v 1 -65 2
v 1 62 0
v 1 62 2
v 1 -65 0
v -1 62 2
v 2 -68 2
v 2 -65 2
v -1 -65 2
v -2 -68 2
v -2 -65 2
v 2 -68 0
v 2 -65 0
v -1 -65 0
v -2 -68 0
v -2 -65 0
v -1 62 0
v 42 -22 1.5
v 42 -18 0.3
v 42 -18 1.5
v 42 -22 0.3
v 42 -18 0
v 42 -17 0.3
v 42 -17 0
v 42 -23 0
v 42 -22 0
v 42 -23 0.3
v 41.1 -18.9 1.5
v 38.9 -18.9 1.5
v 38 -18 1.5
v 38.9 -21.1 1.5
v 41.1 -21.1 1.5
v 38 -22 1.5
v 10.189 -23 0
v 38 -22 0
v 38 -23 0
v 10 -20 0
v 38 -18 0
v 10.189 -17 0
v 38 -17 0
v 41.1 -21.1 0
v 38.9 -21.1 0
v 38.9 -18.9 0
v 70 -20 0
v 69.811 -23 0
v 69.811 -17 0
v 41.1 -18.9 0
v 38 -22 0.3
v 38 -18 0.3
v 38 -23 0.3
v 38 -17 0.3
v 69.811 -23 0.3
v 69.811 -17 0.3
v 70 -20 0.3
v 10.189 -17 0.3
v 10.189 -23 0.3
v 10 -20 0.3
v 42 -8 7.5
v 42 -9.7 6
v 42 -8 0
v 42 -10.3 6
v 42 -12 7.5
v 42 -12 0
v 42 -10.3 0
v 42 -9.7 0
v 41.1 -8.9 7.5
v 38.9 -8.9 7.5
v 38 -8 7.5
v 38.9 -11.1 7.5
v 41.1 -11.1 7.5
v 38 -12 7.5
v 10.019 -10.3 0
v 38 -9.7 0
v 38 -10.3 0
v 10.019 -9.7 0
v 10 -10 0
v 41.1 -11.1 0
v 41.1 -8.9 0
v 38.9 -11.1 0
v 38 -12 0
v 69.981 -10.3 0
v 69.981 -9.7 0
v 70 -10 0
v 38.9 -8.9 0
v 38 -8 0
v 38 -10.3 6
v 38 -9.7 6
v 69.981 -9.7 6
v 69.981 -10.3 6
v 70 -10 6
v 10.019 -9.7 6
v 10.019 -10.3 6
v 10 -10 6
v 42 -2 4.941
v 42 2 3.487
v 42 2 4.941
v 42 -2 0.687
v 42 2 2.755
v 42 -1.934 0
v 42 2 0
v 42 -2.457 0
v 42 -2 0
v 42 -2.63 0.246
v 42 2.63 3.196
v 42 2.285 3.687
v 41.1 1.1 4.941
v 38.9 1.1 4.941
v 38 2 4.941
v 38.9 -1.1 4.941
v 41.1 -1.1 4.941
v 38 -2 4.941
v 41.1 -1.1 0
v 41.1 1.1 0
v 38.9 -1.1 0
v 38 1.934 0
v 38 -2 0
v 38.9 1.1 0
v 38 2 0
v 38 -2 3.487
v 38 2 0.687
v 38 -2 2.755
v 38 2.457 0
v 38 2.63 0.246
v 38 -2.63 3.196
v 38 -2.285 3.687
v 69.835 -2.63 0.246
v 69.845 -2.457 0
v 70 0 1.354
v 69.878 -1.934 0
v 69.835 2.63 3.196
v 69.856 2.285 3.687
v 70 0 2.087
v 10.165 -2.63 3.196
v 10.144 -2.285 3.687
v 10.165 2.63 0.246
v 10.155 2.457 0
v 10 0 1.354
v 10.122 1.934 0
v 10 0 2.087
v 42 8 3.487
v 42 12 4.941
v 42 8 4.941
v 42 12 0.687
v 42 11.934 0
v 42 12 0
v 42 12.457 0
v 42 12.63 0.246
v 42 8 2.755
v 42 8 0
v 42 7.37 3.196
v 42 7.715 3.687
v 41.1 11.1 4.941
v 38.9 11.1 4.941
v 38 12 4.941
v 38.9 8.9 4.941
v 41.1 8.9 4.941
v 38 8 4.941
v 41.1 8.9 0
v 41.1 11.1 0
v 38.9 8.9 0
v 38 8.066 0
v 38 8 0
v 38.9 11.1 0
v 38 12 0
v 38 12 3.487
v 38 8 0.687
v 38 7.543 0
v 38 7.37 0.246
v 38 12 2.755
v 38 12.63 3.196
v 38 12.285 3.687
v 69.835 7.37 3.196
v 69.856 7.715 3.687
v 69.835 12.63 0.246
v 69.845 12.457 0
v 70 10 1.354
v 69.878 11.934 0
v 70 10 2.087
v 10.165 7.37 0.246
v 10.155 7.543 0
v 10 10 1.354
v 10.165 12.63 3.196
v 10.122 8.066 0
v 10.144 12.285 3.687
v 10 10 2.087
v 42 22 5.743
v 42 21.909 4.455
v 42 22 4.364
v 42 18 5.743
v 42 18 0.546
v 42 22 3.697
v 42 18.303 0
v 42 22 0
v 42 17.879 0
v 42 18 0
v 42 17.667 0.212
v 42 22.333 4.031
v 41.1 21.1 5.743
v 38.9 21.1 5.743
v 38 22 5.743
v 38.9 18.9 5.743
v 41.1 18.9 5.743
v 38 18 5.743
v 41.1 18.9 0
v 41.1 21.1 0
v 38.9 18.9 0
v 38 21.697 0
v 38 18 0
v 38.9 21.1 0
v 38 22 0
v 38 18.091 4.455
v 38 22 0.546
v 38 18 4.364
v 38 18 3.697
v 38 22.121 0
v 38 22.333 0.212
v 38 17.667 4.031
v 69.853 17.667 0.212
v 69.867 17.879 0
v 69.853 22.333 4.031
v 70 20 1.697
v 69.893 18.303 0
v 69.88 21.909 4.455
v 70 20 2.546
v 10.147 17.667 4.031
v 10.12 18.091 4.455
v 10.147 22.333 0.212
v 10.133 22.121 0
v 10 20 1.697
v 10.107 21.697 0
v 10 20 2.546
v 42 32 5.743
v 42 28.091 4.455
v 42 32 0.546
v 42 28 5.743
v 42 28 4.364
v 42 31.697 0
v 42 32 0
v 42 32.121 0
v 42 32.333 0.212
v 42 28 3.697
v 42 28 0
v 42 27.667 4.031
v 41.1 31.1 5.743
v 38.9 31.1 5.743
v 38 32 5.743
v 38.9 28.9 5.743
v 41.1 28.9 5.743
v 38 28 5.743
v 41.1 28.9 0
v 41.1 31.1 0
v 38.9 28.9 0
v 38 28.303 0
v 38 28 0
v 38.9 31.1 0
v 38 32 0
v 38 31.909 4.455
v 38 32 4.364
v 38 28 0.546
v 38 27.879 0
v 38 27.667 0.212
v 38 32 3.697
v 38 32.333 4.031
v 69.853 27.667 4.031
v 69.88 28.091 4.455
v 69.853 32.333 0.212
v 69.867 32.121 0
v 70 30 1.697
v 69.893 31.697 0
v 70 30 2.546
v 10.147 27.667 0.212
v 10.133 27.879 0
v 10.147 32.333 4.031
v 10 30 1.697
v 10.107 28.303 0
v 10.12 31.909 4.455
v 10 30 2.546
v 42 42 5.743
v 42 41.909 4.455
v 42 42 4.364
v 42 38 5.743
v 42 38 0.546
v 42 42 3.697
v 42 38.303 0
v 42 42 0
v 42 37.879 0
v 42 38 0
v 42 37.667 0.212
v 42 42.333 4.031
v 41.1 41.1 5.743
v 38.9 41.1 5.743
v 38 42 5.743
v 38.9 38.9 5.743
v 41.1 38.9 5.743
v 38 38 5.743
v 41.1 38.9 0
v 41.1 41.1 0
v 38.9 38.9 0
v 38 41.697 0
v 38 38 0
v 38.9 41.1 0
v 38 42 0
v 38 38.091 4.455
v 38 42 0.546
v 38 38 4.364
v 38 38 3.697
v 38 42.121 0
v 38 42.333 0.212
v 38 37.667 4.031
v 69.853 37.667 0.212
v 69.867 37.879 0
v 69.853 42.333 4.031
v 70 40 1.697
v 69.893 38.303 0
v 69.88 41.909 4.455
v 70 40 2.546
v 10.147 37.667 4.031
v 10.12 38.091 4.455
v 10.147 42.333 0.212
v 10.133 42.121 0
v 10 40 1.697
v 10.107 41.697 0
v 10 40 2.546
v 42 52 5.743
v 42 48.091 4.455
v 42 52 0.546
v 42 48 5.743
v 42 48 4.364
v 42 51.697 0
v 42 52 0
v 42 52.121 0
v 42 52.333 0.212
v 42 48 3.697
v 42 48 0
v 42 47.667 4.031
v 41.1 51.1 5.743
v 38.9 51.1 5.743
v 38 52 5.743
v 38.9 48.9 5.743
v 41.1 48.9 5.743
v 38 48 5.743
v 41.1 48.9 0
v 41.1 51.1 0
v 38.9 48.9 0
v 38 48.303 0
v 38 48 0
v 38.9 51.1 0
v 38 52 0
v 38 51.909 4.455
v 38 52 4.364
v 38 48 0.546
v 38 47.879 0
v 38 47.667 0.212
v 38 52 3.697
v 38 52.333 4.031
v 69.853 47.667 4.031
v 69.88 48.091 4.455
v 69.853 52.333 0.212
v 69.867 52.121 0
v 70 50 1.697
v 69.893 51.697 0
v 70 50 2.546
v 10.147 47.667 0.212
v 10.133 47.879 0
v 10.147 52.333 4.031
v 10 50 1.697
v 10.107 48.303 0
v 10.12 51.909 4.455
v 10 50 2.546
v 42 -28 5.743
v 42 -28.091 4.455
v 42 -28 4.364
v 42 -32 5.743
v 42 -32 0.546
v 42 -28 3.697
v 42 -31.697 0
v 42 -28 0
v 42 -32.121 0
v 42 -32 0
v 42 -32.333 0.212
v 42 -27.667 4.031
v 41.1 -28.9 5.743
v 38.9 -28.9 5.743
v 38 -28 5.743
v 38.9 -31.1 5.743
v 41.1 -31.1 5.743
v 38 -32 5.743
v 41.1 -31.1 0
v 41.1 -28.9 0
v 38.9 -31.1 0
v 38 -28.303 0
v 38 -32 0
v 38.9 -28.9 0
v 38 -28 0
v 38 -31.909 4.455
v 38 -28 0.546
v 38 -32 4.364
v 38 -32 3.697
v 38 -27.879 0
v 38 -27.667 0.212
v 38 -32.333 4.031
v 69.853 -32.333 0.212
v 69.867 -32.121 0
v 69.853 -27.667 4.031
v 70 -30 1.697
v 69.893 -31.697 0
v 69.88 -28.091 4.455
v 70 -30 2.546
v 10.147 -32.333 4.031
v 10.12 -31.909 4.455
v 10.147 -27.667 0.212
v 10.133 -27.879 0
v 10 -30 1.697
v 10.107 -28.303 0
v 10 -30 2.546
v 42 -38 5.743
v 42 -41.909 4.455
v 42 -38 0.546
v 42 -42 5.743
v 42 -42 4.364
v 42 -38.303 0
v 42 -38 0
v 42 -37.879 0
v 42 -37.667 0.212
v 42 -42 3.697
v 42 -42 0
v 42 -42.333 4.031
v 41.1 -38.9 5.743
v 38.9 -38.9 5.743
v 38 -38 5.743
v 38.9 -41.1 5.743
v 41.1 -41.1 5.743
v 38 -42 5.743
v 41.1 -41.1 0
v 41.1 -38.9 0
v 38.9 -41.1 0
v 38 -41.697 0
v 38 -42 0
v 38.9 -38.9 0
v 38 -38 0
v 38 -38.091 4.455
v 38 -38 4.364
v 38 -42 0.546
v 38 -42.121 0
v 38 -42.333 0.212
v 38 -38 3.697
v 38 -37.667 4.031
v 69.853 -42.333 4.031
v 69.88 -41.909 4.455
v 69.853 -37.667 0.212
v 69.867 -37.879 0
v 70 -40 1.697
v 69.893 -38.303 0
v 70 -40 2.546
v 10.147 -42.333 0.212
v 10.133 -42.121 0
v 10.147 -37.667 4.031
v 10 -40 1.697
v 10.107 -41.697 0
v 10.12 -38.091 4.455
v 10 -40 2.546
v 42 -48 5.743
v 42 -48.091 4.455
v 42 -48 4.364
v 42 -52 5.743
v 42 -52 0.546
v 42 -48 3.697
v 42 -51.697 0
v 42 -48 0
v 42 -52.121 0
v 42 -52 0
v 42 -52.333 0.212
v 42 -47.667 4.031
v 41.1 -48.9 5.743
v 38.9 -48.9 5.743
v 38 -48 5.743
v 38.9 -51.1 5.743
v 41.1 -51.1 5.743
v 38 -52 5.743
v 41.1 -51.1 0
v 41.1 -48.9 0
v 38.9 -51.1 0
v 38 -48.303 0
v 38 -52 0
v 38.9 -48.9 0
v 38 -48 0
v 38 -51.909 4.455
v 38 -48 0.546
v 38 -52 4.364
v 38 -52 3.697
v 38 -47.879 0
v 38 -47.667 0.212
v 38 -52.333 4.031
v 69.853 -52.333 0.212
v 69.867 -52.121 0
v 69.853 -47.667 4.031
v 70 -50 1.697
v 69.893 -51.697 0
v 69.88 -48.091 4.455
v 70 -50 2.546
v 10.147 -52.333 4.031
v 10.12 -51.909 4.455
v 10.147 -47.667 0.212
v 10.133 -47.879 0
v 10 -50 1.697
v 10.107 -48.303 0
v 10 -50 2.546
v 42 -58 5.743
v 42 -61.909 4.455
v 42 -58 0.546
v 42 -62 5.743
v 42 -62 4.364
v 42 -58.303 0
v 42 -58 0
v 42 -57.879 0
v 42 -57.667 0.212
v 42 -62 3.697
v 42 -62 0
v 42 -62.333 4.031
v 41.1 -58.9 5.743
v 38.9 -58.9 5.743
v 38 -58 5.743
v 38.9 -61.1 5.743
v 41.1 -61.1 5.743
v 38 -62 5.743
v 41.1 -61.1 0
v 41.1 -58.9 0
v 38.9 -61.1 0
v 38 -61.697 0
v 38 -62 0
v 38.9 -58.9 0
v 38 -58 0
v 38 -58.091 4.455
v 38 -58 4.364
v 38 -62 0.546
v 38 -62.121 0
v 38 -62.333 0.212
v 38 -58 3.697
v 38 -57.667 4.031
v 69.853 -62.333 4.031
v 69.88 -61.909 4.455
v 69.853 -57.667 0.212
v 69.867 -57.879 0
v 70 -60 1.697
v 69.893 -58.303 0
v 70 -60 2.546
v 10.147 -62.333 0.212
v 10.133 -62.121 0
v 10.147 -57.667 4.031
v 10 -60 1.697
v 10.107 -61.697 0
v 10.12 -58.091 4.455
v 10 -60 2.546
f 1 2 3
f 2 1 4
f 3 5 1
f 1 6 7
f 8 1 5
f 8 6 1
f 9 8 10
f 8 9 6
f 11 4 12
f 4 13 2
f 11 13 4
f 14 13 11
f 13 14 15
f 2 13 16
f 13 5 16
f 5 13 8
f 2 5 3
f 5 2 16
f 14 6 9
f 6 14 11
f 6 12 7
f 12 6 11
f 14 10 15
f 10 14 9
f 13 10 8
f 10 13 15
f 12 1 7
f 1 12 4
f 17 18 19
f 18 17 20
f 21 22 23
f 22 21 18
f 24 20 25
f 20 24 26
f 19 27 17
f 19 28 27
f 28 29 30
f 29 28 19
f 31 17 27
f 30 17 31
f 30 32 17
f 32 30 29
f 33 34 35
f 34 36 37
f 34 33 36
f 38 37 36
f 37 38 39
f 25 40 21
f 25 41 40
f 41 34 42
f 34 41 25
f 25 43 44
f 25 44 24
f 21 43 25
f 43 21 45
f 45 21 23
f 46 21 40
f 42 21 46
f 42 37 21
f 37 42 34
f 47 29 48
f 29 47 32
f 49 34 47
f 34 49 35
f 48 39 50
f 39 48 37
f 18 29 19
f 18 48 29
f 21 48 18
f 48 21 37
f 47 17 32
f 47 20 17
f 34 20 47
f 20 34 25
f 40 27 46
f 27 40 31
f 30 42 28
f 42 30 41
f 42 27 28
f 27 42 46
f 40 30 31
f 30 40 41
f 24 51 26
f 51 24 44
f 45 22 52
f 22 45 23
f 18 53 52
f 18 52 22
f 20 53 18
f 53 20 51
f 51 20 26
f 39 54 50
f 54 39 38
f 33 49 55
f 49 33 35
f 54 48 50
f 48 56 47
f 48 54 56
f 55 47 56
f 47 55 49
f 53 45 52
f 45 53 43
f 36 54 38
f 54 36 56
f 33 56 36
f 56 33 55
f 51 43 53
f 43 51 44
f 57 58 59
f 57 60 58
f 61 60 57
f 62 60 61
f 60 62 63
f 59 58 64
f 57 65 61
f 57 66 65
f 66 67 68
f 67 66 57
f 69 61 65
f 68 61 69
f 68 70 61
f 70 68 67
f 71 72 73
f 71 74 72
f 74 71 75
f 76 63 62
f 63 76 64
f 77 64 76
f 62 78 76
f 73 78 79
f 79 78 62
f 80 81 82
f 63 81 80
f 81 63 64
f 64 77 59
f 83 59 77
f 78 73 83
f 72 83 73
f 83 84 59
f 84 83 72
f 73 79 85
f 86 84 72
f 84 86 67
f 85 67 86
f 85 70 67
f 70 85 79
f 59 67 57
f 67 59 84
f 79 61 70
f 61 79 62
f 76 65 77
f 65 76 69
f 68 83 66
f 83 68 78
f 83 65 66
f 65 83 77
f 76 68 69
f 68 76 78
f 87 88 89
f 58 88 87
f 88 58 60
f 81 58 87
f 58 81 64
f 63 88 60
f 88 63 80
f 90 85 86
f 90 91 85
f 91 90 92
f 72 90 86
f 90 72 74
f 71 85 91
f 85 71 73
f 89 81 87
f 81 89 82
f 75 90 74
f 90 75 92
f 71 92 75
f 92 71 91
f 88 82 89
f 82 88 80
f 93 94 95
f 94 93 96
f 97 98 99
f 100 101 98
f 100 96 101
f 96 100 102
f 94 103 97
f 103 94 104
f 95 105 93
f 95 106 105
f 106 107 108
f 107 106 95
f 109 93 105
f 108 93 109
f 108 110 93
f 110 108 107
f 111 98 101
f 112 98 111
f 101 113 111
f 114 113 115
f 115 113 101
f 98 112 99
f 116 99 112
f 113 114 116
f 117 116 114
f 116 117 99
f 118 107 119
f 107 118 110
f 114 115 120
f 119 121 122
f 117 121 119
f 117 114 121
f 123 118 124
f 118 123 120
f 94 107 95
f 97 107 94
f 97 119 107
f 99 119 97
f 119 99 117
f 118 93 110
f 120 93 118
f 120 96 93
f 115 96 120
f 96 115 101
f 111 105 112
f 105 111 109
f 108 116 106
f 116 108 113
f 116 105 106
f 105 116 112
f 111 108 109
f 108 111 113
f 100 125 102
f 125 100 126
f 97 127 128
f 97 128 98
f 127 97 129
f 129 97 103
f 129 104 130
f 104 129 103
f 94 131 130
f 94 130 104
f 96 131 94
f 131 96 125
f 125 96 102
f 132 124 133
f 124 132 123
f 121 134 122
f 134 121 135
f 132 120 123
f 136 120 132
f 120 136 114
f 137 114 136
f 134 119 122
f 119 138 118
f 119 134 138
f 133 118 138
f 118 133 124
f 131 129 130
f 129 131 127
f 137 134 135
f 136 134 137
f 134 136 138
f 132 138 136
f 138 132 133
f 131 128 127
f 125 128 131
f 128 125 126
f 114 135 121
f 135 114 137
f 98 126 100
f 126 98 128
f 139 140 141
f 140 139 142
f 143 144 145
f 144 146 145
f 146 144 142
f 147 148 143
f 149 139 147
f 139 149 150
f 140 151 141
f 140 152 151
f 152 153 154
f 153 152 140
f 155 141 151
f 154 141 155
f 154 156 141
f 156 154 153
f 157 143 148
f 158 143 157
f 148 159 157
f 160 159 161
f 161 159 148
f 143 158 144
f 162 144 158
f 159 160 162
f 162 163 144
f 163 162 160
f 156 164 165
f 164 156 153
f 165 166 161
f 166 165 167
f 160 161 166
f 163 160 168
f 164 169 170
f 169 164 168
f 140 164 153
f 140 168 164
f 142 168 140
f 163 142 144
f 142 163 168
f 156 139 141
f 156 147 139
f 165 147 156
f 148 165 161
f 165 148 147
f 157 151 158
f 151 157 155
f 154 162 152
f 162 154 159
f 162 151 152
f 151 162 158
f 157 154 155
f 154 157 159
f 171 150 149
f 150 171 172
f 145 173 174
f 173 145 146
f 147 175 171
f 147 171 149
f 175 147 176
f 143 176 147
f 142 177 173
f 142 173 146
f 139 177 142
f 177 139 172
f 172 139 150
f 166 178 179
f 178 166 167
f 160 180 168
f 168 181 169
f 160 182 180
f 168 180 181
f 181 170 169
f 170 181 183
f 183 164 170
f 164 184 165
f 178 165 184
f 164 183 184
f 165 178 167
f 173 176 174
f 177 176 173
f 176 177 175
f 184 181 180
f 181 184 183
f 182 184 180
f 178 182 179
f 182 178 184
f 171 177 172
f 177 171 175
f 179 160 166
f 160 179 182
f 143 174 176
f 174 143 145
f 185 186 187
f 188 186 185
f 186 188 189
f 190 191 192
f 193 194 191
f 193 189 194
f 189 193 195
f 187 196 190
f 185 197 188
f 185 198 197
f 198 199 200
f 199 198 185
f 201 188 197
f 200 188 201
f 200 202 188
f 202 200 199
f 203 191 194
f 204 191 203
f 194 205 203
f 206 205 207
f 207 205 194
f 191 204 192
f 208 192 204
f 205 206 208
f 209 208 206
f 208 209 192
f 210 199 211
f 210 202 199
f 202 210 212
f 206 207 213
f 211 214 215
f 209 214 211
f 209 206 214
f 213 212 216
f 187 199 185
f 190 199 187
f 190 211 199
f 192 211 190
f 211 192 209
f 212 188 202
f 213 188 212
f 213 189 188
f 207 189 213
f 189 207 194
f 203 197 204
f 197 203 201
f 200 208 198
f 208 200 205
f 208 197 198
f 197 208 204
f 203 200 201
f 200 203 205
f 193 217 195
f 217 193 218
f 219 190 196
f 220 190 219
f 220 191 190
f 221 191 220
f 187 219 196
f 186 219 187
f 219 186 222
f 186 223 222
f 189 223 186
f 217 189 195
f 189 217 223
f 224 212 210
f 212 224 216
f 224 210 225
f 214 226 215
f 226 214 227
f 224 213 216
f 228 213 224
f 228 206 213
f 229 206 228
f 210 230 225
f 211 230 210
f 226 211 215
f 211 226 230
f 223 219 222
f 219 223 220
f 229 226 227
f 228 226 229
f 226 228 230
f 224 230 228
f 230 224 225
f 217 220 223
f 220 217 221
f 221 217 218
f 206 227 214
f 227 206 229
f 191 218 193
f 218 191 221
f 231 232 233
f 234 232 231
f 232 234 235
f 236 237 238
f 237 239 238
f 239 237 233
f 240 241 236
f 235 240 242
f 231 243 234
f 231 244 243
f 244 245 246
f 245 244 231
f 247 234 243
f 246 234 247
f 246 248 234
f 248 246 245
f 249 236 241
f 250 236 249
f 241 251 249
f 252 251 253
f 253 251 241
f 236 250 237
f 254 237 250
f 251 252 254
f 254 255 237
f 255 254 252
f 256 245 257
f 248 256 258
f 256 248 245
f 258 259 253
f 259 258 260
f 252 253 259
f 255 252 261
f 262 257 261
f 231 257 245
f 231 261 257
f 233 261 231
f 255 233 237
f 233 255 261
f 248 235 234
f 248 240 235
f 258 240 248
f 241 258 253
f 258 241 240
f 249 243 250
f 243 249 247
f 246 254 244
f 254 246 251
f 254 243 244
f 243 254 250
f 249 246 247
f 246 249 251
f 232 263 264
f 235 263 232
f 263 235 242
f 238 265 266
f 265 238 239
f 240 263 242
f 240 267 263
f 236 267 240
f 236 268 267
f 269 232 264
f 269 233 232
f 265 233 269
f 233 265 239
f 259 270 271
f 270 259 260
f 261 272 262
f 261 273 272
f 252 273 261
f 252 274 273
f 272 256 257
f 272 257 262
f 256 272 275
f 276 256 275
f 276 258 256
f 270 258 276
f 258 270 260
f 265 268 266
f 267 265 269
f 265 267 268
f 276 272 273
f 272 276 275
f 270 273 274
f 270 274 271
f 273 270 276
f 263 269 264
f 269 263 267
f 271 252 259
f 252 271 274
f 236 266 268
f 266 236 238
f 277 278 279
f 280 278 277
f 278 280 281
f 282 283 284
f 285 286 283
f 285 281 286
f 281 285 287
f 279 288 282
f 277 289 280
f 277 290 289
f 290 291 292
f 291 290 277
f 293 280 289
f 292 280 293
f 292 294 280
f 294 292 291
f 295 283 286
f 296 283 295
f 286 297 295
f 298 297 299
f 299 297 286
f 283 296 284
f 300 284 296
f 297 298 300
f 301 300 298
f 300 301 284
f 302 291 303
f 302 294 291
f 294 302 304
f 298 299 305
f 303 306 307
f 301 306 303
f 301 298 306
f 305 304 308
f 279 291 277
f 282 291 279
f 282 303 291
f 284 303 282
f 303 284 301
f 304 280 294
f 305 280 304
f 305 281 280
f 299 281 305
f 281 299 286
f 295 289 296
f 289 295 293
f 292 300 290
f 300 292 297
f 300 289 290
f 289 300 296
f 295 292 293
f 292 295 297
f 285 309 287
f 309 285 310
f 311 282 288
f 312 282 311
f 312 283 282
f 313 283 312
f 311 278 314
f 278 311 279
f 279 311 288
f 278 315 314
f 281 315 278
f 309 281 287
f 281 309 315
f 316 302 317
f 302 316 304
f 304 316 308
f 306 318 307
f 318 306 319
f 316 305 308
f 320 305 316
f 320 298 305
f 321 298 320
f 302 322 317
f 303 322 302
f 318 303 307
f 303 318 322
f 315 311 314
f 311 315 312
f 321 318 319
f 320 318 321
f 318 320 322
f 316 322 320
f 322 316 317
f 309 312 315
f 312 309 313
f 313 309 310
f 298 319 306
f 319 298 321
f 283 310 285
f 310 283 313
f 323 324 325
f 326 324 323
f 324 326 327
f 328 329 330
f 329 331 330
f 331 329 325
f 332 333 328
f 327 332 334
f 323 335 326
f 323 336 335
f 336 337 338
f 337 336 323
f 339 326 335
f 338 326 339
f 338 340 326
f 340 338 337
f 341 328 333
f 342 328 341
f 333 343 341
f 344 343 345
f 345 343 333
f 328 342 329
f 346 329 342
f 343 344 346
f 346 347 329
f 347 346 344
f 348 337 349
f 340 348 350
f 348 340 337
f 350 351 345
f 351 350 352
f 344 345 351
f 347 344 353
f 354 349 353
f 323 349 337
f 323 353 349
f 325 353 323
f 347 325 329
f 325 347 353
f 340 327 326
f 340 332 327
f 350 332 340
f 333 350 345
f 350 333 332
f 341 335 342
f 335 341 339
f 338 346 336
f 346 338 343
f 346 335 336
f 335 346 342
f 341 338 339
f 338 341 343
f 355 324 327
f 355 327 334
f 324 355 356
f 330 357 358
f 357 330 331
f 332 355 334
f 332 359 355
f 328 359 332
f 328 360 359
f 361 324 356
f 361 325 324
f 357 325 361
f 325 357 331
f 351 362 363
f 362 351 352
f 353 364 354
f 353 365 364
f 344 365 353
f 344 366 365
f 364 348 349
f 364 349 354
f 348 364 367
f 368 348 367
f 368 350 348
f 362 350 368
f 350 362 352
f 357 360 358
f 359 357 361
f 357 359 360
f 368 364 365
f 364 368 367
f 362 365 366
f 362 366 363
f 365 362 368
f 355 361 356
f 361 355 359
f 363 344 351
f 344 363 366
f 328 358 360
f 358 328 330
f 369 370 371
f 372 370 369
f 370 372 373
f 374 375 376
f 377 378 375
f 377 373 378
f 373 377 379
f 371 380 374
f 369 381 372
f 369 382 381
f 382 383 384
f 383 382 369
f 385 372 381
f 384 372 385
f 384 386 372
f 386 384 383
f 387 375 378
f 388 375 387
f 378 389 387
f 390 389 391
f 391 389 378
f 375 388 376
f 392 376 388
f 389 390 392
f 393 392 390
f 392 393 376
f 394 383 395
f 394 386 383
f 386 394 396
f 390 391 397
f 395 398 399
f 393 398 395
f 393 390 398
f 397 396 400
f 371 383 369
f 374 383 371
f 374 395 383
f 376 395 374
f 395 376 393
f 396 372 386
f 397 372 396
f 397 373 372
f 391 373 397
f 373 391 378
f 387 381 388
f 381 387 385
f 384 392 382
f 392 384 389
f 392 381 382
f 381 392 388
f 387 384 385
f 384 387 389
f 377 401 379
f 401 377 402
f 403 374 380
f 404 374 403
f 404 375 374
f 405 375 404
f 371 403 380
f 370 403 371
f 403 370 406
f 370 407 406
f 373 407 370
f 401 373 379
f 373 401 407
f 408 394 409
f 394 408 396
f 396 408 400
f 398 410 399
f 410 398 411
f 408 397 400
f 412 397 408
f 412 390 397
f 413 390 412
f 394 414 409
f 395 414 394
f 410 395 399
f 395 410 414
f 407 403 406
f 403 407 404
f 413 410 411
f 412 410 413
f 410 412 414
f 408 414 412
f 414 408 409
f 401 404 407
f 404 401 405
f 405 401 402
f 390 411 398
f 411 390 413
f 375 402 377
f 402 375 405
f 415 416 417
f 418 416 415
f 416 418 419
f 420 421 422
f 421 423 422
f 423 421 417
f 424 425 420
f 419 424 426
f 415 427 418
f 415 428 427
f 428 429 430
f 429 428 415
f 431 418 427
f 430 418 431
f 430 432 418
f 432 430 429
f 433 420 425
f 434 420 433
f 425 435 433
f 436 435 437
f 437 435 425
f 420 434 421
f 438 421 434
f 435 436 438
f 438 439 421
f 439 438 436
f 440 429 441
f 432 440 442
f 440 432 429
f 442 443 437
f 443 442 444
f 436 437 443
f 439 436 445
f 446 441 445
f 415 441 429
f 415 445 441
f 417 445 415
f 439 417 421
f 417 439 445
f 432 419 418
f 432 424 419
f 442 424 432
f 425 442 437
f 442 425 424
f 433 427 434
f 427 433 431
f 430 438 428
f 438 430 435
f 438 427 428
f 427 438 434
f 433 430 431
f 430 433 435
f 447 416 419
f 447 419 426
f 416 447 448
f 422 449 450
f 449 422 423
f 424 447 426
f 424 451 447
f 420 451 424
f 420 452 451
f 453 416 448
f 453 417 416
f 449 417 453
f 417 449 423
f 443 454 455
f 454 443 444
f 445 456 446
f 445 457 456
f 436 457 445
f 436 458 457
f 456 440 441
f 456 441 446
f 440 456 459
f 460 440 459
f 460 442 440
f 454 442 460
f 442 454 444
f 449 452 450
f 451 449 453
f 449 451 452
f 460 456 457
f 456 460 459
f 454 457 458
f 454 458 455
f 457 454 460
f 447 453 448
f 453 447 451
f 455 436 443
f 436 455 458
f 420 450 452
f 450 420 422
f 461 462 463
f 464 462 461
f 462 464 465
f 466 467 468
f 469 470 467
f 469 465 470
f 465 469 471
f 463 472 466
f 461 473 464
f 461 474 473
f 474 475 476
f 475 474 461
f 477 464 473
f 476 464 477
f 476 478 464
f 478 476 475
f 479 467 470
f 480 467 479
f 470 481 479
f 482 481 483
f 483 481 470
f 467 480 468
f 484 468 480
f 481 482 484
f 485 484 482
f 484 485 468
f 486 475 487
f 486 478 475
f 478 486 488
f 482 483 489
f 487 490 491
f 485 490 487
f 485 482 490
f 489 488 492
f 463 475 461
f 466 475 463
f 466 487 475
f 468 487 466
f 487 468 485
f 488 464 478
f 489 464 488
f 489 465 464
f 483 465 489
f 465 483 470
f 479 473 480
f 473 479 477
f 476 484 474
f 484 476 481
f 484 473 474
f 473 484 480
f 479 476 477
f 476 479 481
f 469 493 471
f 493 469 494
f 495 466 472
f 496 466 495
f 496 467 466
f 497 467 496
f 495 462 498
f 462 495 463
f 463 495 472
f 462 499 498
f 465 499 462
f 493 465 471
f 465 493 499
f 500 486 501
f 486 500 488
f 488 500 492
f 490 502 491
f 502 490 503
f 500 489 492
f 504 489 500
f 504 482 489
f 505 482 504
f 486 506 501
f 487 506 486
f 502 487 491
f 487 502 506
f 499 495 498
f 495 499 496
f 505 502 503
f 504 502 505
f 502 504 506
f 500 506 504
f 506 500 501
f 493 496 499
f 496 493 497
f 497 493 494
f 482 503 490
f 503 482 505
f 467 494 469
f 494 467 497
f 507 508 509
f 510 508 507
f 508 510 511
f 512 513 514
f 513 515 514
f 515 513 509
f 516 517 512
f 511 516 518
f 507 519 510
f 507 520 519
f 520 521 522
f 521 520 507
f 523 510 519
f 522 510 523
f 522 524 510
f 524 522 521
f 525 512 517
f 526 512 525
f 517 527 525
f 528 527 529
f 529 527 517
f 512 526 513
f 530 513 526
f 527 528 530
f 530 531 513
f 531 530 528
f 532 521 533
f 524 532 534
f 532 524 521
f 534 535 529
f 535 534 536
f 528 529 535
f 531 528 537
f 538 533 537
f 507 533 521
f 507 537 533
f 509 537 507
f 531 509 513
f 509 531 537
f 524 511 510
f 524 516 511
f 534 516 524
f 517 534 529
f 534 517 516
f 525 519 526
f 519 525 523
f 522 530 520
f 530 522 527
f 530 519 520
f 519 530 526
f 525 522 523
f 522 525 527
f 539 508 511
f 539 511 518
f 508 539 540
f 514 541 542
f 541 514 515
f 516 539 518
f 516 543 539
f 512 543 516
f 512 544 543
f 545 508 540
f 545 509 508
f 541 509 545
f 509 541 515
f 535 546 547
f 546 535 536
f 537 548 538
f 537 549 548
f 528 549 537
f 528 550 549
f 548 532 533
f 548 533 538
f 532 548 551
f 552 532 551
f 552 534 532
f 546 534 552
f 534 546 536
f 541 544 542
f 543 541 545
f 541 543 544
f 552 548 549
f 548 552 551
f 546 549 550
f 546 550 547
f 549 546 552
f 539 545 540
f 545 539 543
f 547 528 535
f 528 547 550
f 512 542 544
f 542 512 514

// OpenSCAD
$fn=50;
ts=2;
tl=0.6;

//шприц
di=60;//диаметр внутри
do=22;//диаметр снаружи
li=136;//длина внутри
duh=60;//диаметр уха 
huh=2.6;//толщина уха
dno=4.4;//диаметр носика у основания, у конца на % меньше
hno=10;//длина носика
ugol=30;

tn=1;//толщина среза вала
zv=5; //высота центрального диска вала
ze=5; //высота центрального диска ерша
zskr=zv+ze;
dskr=10;//диаметр центрального диска
dval=3+0.4;//диаметр вала привода

f_sh=4.0; //ширина фиксатора
ft=1.5; //основная толщина фиксатора
zbf=2.5+ft;//зуб фиксатора
nfix=10;//нога фиксатора

hv=3;//зазор между винтами

//fix_pr ();
module fix_pr (){
    //translate([ft/2,(ph3[8][1]+fxw+fdoz)/2-fttz-fxw,f_sh/2])cube([ft, ph3[8][1]+fxw+fdoz,f_sh],true);
    //translate([(fog)/2,-ts/2-2,f_sh/2])cube([fog, ts,f_sh],true);
    translate([-ft/2,nfix/2,f_sh/2])cube([ft, nfix,f_sh],true);
    translate([0,-14.5,0])linear_extrude(f_sh)polygon([[0,0],[-ft,0],[-zbf,15],[0,14.5]]);//0.5 вынужденная поправка в связи с ошибкой во втором слое
}


//disk_z();

module disk_z(){
    translate([0,dval/2,zv/2+ze])cube([3,tn,zv],true);
    difference(){
        translate([0,0,0])cylinder(zskr,dskr/2,dskr/2);
        translate([0,0,ze-0.1])cylinder(zv+0.2,dval/2,dval/2);
        translate([0,0,-0.1+ze/2])cube([ts+0.2,ts+0.2,ze+0.2],true);
    }
}


//ersh();

module ersh(){
    translate([0,li/2-3,ts/2])cube([ts,li,ts],true);
    translate([0,0,0])vint();
    translate([0,5,0])vint();
    translate([0,10,0])vint();
    translate([0,15,0])vint();
    translate([0,20,0])vint();
    translate([0,25,0])vint();
    translate([0,30,0])vint();
    translate([0,35,0])vint();
    translate([0,40,0])vint();
    translate([0,45,0])vint();
    translate([0,50,0])vint();
    translate([0,55,0])vint();
    translate([0,60,0])vint();
    //translate([0,65,0])vint();
    //translate([0,70,0])vint();
    //translate([0,80,0])vint();
}
//vint();
module vint(){
    translate([0,0,ts/2])intersection(){
        union(){
            translate([5*di/12,0,0])rotate([ugol,0,0])cube([di/6,tl,3*ts],true);
            translate([4*di/12,0,0])cube([tl,ts,3*ts],true);
            translate([-5*di/12,0,0])rotate([-ugol,0,0])cube([di/6,tl,3*ts],true);
            translate([-4*di/12,0,0])cube([tl,ts,3*ts],true);
            translate([2*di/12,0,0])rotate([-ugol,0,0])cube([di/3,tl,3*ts],true);
            translate([-2*di/12,0,0])rotate([ugol,0,0])cube([di/3,tl,3*ts],true);
        }
        cube([2*di,li,ts],true); 
    }
}

//ersh_k();

module ersh_k(){
    dd=6;
    translate([0,(li-dd)/2-3,ts/2])cube([ts,(li-dd),ts],true);
    translate([0,0,0])vint1();
    translate([0,10,0])vint1();
    translate([0,20,0])vint1();
    translate([0,30,0])vint1();
    translate([0,40,0])vint1();
    translate([0,50,0])vint1();
    translate([0,60,0])vint1();
    //translate([0,70,0])vint();
    //translate([0,80,0])vint();
}
//cube([di,tl,3*ts],true);
//vint1();
module vint1(){
    translate([0,0,ts/2])intersection(){
        union(){
            translate([3*di/8,0,0])rotate([90,0,0])cube([di/4,tl,3*ts],true);
            translate([di/4,0,0])cube([tl,ts,3*ts],true);
            translate([-3*di/8,0,0])rotate([90,0,0])cube([di/4,tl,3*ts],true);
            translate([-di/4,0,0])cube([tl,ts,3*ts],true);
            translate([1*di/8,0,0])rotate([-ugol,0,0])cube([di/4,tl,3*ts],true);
            translate([-1*di/8,0,0])rotate([ugol,0,0])cube([di/4,tl,3*ts],true);
        }
        cube([2*di,li,ts],true); 
    }
}

ersh_n();
module ersh_n(){
    dd=6;
    translate([0,-(li-dd)/2,0]){
        translate([0,(li-dd)/2-3,ts/2])cube([ts,(li-dd),ts],true);
        translate([0,-3/2,ts/2])cube([2*ts,3,ts],true);
    }

}
kit();
module kit(){
    translate([40,-20,0])vint_n(90, 3*ts);
    translate([40,-10,0])vint_n(0, 3*ts);
    translate([40,0,0])vint_n(-55, 3*ts);
    translate([40,10,0])vint_n(55, 3*ts);
    translate([40,20,0])vint_n(-45, 3*ts);
    translate([40,30,0])vint_n(45, 3*ts);
    translate([40,40,0])vint_n(-45, 3*ts);
    translate([40,50,0])vint_n(45, 3*ts);
    translate([40,-30,0])vint_n(-45, 3*ts);
    translate([40,-40,0])vint_n(45, 3*ts);
    translate([40,-50,0])vint_n(-45, 3*ts);
    translate([40,-60,0])vint_n(45, 3*ts);
}

module vint_n(aa, rr){ //угол, размер(ширина), сдвиг от центра
    ddd=0.2;
    hh=hv/2+cos(aa)*rr;
    sdv=rr/2-cos(aa)*rr/2;
    intersection(){
        union(){
            translate([0,0,hh/2])difference(){
                cube([2*ts,2*ts,hh],true);
                cube([ts+ddd,ts+ddd,2*hh],true);
            }
            translate([di/4+ts,0,rr/2-sdv])rotate([aa,0,0])cube([di/2,tl,rr],true);
            translate([-(di/4+ts),0,rr/2-sdv])rotate([-aa,0,0])cube([di/2,tl,rr],true);
        }
        cylinder(20,di/2,di/2); 
    }
}
